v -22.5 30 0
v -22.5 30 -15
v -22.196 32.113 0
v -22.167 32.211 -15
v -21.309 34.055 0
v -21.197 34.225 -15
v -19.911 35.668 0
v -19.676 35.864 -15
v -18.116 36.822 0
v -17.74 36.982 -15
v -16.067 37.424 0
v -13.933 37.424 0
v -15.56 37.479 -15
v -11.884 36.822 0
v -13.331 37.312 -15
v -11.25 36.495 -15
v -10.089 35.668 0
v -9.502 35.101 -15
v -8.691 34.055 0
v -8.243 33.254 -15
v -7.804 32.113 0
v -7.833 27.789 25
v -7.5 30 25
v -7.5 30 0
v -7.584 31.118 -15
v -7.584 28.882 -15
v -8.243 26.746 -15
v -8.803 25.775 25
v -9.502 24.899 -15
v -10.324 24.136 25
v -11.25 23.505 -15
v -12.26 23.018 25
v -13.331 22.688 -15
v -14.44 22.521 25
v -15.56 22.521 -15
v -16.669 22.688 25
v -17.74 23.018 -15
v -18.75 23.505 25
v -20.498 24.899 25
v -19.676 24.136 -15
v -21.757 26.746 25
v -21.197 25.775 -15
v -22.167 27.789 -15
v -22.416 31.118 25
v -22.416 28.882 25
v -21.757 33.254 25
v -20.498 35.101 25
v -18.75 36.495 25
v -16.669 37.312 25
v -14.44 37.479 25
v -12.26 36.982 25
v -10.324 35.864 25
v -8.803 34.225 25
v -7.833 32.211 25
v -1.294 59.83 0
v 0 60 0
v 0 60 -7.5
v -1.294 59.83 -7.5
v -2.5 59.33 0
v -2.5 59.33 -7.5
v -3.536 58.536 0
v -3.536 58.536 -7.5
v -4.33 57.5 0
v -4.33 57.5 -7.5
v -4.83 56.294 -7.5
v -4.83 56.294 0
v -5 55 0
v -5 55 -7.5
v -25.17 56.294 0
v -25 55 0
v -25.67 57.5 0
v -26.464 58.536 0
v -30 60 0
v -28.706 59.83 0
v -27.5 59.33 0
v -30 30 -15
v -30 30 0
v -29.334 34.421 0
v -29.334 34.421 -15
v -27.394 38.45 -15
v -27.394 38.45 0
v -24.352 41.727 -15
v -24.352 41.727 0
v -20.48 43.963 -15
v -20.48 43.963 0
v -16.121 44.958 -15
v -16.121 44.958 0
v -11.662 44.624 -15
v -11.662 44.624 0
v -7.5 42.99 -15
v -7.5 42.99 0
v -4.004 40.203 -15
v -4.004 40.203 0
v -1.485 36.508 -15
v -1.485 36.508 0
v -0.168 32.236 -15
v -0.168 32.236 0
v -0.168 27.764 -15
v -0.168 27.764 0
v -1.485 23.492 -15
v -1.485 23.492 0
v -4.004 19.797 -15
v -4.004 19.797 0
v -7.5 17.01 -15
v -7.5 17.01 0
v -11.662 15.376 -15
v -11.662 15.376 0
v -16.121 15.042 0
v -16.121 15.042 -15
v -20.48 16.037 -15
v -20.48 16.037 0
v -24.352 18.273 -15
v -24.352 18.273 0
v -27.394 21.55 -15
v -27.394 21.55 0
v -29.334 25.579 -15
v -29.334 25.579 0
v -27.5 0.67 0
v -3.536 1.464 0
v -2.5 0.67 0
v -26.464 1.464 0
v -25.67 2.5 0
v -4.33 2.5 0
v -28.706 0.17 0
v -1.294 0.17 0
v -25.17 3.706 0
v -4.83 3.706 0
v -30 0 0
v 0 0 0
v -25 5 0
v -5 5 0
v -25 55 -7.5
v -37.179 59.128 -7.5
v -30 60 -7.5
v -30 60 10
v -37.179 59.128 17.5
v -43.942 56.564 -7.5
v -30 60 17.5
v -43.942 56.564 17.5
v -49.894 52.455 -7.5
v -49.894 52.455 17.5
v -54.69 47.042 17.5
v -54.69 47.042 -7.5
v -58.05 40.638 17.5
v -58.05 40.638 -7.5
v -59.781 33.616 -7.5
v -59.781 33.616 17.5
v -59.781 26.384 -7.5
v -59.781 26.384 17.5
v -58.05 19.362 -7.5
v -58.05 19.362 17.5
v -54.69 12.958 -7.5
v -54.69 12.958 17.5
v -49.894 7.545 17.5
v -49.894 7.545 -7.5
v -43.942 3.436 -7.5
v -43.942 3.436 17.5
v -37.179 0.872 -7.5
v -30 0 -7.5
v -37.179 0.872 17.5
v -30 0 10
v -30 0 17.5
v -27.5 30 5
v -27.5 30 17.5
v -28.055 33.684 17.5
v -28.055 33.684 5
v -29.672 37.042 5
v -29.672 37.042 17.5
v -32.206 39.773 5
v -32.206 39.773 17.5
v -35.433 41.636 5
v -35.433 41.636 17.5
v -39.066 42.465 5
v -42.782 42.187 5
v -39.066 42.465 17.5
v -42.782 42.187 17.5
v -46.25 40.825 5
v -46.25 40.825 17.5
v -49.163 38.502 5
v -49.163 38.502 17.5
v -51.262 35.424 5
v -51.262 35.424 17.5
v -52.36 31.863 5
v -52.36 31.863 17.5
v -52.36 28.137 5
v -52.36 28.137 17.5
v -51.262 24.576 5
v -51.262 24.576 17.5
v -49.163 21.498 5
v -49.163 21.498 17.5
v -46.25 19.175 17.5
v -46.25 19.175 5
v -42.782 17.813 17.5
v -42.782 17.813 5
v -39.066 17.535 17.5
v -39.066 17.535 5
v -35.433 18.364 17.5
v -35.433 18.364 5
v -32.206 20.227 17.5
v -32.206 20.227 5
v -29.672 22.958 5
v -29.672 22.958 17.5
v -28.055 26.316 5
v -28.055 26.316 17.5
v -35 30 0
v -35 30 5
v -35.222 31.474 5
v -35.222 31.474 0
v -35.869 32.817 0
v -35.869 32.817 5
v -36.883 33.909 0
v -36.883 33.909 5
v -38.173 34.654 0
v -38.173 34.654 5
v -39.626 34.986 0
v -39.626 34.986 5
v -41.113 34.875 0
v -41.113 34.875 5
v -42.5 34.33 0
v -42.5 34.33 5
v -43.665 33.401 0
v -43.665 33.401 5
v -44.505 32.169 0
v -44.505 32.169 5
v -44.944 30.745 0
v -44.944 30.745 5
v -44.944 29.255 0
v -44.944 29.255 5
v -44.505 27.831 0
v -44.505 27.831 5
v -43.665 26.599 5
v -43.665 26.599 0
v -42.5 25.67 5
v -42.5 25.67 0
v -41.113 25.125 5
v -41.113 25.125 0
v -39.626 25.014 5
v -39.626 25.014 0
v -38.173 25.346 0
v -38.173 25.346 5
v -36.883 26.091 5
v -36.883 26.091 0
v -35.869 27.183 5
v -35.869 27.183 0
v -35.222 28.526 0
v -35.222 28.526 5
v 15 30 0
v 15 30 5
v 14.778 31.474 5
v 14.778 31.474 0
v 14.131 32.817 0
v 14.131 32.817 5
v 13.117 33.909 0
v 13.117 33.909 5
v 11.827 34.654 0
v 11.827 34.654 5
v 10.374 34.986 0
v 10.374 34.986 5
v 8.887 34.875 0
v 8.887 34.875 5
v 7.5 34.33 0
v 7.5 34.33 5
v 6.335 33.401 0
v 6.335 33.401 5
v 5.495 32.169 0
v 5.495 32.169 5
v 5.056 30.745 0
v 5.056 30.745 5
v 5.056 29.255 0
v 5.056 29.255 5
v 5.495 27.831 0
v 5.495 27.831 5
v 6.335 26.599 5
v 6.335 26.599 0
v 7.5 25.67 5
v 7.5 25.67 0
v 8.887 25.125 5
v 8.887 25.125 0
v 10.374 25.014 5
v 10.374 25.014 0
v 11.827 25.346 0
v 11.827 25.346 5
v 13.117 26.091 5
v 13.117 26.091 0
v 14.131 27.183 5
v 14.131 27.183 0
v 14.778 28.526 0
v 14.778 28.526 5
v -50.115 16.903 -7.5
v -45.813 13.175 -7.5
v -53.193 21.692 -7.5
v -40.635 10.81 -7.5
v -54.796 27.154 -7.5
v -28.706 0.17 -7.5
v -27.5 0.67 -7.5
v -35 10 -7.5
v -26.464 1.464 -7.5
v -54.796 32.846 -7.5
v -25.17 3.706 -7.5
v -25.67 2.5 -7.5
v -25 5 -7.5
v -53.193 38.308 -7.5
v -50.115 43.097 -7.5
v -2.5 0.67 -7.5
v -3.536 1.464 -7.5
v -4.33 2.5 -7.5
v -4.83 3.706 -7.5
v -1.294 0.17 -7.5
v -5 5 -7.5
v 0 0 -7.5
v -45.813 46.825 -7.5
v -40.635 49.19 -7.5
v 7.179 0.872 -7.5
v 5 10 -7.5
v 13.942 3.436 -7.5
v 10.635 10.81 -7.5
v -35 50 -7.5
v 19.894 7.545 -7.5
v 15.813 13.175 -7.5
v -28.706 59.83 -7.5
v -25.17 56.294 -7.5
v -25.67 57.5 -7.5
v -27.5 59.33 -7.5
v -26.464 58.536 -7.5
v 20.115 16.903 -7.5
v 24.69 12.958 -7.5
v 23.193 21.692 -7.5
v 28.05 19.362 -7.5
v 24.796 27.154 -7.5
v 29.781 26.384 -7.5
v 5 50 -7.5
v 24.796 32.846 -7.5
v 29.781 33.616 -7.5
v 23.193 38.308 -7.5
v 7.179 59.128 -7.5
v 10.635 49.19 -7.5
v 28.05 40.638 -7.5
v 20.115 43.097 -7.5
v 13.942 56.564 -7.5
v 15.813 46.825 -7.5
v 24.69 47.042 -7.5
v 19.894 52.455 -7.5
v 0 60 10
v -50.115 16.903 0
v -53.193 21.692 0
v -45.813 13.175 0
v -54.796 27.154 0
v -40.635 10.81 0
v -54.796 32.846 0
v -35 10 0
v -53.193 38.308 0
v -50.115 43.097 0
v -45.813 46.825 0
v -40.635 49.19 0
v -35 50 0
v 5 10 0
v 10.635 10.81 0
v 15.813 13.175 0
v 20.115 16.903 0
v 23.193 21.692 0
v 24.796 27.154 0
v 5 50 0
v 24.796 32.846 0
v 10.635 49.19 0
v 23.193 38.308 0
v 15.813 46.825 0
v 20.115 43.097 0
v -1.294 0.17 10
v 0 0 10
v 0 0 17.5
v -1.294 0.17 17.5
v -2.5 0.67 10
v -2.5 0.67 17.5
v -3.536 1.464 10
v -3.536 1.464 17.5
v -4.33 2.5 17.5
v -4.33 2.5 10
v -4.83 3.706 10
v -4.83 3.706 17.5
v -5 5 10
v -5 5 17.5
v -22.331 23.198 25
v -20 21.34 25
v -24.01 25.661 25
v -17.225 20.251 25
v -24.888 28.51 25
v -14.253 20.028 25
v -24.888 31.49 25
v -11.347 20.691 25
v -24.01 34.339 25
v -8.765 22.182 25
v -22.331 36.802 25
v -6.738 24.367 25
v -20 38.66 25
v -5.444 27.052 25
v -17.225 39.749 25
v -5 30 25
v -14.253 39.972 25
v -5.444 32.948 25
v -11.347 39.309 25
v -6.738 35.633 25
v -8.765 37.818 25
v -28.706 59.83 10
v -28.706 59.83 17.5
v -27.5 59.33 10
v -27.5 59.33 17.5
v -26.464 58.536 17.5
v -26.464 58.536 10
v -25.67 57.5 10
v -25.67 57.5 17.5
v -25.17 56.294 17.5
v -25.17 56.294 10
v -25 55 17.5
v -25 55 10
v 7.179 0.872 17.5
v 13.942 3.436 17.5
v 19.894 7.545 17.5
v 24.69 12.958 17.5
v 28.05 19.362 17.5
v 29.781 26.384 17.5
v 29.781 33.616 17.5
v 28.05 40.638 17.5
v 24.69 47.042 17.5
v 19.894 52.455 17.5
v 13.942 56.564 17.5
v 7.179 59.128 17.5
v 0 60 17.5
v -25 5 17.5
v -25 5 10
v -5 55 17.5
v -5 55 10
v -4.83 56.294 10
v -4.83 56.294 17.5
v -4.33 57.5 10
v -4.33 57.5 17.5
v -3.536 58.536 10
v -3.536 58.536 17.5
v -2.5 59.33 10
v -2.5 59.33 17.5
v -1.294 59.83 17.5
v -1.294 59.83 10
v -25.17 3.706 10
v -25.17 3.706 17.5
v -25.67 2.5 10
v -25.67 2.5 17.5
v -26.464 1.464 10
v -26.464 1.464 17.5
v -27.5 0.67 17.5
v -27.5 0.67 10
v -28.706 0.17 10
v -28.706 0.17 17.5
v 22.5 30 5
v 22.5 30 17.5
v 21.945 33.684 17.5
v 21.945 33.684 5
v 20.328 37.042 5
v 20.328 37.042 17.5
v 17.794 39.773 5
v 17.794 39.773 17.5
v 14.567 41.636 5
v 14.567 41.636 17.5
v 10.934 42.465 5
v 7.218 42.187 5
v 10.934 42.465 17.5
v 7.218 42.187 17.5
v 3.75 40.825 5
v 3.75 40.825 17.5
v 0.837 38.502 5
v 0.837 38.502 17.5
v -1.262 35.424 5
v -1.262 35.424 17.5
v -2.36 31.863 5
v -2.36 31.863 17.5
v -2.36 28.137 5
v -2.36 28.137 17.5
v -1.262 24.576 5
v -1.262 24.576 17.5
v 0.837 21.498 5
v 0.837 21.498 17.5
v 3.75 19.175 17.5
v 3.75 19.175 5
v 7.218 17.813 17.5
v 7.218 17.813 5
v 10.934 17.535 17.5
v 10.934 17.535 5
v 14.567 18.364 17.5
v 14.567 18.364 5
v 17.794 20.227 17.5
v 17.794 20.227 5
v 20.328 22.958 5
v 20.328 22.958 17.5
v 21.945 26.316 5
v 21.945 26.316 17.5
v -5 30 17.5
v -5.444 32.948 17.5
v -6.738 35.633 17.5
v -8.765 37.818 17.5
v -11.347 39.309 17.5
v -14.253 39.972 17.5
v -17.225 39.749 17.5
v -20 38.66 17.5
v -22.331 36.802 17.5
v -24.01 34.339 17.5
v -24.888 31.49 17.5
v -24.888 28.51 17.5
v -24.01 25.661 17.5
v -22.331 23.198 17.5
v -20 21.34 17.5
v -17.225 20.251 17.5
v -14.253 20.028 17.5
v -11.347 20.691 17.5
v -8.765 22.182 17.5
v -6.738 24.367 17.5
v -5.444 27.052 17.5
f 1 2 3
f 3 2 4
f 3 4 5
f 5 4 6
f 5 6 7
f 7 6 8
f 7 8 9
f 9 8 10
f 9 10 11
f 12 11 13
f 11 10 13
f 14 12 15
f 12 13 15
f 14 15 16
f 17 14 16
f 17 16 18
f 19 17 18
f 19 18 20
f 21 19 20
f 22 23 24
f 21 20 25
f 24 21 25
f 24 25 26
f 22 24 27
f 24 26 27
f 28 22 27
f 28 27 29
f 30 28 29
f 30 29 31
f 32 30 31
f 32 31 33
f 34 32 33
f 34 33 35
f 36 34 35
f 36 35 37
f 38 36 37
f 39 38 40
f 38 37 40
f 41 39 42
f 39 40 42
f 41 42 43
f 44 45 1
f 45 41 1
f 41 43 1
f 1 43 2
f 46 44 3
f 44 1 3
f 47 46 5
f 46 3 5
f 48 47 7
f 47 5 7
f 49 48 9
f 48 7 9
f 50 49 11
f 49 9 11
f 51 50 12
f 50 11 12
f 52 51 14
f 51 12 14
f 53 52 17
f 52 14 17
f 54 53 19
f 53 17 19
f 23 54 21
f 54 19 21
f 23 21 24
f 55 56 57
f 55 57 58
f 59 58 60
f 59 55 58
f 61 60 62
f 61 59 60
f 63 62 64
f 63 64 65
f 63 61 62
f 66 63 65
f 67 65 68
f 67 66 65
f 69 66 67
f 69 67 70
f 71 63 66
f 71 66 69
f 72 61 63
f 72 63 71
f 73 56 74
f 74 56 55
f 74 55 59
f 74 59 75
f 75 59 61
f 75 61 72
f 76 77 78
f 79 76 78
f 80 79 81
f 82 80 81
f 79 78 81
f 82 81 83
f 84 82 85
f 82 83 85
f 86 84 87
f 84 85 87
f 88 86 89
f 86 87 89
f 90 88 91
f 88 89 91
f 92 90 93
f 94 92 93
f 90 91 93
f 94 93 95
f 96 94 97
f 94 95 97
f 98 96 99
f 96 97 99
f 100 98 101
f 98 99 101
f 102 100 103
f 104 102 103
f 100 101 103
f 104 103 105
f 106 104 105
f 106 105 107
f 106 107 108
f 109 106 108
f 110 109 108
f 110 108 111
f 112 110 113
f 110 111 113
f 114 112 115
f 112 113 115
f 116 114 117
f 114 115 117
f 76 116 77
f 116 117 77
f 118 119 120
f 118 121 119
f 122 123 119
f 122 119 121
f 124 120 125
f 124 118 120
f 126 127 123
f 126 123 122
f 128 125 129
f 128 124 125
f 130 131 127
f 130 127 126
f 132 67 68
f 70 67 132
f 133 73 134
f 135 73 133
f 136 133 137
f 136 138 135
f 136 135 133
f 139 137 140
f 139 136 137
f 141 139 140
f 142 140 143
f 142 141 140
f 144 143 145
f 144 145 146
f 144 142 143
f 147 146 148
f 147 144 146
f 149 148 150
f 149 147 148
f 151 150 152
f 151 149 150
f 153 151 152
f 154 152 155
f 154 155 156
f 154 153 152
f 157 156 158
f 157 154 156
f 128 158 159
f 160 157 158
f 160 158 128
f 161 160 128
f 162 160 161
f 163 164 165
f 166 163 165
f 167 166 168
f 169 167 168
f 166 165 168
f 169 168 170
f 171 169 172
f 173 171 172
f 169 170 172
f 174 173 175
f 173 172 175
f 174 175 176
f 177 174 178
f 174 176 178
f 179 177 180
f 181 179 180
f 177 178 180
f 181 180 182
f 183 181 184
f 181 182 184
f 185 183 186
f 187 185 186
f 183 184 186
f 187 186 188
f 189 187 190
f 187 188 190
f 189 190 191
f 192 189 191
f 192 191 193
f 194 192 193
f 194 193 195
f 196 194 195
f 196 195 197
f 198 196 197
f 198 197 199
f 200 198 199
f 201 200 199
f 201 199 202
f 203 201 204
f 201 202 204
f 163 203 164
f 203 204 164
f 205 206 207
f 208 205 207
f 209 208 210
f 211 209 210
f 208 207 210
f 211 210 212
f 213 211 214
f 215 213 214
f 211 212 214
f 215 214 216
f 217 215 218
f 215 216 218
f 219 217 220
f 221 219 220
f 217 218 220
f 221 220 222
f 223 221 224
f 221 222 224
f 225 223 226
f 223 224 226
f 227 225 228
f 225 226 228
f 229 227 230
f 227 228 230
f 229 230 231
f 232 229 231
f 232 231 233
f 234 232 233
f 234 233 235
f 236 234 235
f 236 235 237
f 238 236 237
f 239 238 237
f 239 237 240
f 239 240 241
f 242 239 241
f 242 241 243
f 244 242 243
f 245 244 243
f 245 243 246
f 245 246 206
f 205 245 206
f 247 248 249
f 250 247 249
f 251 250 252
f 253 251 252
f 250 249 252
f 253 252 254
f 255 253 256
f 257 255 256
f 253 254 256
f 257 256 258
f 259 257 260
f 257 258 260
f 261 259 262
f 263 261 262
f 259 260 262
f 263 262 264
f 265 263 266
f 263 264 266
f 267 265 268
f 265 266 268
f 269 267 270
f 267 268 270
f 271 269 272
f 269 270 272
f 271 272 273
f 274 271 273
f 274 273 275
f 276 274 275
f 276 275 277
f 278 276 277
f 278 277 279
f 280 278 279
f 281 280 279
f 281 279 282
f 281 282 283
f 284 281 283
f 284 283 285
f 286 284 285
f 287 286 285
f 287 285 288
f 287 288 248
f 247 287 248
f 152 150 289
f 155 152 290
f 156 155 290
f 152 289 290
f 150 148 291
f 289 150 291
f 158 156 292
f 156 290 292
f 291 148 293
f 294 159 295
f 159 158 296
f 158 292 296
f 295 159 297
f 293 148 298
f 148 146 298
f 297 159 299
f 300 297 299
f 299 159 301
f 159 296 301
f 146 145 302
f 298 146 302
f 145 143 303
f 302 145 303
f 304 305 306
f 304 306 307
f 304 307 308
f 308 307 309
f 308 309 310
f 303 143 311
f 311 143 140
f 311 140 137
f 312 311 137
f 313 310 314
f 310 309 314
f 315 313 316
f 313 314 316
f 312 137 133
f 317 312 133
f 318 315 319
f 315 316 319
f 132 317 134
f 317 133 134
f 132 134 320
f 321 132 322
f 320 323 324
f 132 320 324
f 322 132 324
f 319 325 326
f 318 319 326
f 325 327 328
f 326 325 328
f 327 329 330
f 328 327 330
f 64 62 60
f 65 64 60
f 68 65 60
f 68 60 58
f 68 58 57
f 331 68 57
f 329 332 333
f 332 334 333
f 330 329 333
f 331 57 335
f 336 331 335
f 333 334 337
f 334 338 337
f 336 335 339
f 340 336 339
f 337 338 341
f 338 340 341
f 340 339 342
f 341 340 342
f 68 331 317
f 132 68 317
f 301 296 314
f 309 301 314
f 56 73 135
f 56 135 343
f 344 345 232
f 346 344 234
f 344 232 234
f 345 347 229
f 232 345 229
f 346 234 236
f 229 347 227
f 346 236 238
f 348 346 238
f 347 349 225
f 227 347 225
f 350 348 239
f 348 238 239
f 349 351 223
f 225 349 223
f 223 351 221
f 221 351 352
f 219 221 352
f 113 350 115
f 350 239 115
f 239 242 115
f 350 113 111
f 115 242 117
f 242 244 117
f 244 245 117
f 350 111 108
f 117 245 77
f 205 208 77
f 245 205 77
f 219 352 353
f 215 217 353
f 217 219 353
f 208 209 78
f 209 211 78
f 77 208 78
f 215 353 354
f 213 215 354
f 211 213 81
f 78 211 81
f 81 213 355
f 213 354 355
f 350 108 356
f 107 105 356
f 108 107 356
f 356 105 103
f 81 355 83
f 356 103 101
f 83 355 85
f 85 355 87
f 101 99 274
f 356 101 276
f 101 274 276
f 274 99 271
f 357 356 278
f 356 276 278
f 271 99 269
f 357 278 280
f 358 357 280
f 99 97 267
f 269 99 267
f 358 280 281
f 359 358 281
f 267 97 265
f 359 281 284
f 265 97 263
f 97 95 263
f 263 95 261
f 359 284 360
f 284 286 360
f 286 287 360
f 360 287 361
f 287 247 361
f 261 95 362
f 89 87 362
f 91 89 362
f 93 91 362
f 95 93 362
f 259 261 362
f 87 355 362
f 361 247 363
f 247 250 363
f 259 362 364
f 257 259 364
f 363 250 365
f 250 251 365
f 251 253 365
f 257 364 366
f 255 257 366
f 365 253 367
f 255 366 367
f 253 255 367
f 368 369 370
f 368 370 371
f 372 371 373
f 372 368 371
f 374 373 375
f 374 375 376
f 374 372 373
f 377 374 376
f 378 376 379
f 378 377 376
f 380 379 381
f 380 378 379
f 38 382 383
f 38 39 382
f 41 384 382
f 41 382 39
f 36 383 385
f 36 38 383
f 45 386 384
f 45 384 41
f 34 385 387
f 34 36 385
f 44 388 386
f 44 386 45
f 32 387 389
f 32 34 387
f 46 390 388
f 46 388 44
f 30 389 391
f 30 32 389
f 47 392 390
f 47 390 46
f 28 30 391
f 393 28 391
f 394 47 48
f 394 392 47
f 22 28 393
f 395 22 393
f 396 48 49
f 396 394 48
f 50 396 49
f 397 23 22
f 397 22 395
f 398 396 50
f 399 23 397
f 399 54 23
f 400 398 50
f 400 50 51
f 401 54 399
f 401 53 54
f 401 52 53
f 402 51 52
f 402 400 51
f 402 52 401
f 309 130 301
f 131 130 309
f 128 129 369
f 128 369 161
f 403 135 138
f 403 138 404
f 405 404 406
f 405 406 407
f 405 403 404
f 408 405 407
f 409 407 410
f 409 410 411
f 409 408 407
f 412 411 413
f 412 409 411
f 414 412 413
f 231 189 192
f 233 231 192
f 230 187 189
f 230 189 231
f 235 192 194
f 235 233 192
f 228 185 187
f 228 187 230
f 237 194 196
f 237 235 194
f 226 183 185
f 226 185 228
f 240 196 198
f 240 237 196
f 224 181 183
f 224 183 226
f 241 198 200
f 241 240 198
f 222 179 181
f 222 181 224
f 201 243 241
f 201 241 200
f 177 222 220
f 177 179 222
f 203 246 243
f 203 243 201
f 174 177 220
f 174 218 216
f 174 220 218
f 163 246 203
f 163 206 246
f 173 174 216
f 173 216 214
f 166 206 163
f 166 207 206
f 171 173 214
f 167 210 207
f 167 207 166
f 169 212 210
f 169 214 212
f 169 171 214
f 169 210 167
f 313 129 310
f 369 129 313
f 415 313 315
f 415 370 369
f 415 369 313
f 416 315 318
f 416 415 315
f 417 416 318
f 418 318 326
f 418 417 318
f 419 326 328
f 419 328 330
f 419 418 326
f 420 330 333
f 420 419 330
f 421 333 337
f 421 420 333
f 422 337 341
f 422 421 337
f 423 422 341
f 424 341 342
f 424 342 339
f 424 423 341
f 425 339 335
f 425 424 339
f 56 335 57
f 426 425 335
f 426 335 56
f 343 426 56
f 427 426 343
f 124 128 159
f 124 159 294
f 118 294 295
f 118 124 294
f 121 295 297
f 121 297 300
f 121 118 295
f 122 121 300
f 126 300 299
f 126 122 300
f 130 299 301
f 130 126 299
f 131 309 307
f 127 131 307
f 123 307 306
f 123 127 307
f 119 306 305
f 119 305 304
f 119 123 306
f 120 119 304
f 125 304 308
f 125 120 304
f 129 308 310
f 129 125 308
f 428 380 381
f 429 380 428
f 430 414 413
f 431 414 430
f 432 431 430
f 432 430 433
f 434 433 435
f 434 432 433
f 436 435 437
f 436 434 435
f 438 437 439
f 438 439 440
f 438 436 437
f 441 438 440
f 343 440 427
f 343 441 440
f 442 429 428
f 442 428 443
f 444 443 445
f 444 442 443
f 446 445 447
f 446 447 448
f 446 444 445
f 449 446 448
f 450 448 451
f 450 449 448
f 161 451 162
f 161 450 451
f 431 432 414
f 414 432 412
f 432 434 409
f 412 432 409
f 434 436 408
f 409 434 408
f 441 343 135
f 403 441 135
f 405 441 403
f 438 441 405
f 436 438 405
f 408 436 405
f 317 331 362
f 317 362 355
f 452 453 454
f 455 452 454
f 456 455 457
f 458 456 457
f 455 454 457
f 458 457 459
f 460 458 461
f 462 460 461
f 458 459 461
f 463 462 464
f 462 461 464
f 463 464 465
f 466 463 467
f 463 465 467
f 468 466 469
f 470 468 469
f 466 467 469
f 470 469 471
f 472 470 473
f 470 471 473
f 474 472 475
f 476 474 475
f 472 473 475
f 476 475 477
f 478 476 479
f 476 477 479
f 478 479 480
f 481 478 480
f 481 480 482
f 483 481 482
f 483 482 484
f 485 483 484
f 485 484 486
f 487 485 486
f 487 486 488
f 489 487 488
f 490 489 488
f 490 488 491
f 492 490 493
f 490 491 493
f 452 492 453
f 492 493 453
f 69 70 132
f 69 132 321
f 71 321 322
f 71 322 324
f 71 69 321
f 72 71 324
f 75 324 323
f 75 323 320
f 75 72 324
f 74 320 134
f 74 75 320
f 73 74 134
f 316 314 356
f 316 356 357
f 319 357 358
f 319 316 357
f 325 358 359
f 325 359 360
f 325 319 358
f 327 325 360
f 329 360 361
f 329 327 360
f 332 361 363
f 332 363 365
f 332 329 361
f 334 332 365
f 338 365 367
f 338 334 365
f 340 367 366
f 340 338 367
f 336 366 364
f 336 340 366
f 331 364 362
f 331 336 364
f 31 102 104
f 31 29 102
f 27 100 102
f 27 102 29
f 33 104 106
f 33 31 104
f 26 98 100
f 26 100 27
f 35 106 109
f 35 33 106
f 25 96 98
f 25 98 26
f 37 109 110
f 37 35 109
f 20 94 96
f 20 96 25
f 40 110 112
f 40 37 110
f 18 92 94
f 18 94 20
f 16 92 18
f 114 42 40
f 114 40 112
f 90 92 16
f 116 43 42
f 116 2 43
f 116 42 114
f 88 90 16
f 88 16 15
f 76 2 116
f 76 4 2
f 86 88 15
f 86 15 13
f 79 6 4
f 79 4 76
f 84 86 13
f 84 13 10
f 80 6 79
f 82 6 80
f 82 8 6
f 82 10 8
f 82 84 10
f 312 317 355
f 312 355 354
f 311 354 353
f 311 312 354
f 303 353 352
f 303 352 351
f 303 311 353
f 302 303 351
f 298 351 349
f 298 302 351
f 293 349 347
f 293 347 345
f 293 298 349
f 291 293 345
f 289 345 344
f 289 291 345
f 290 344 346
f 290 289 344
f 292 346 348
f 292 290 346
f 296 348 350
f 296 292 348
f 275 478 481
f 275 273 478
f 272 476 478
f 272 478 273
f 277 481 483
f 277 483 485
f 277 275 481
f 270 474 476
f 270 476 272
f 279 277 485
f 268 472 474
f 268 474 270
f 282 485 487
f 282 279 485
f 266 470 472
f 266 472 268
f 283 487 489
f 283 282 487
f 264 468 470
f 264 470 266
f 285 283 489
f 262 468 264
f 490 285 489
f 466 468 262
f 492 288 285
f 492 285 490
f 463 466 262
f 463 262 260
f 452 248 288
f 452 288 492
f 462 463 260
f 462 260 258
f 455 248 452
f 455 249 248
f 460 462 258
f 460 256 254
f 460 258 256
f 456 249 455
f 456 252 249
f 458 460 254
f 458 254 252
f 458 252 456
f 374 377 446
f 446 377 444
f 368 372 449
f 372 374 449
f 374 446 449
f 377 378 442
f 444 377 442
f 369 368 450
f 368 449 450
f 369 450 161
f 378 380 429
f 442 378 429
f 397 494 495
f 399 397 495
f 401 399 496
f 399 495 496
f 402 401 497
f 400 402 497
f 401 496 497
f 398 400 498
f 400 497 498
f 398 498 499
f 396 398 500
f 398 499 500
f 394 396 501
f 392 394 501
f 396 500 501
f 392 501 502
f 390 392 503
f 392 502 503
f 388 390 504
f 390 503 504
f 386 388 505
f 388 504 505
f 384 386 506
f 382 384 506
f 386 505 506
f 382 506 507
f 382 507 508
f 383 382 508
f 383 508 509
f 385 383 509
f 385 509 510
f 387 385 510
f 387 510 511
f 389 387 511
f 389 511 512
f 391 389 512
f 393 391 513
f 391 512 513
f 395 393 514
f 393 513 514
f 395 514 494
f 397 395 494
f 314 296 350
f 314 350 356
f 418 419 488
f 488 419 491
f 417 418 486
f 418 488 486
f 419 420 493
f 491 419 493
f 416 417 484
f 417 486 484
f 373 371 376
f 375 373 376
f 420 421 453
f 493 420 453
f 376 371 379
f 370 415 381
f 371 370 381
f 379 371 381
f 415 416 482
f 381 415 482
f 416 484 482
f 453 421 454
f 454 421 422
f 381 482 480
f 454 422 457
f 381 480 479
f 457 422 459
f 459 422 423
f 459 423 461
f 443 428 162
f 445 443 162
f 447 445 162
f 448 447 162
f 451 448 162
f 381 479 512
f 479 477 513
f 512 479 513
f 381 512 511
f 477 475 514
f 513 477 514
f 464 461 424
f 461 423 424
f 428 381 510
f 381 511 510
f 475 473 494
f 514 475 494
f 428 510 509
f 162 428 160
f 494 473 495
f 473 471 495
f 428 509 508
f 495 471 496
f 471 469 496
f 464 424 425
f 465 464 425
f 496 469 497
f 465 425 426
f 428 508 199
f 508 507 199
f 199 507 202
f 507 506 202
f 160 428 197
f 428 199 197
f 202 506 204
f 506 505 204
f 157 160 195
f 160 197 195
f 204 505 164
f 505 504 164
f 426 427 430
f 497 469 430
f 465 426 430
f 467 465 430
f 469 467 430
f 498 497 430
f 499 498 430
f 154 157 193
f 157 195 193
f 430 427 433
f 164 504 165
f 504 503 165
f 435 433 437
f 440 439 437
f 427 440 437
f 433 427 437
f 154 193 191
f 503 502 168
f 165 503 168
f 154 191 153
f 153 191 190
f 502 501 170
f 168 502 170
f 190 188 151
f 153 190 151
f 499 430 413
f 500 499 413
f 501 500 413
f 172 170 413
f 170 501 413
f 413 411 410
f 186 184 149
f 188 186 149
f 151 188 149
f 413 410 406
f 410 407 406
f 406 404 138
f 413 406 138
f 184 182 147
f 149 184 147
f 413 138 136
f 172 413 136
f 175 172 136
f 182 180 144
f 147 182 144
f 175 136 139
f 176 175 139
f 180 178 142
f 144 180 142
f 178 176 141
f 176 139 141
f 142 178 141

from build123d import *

# Parameters (mm, degrees)
BOSS_EXTRUDE1_DEPTH = 10
BOSS_EXTRUDE2_DEPTH = 7.5
BOSS_EXTRUDE3_DEPTH = 7.5
CUT_EXTRUDE1_DEPTH  = 7.5
SKETCH5_R           = 12.5
CUT_EXTRUDE3_DEPTH  = 12.5
SKETCH6_R           = 5
CUT_EXTRUDE4_DEPTH  = 17.5
SKETCH7_R           = 10
BOSS_EXTRUDE4_DEPTH = 7.5
SKETCH8_R           = 7.5
CUT_EXTRUDE5_DEPTH  = 25
SKETCH10_R          = 15
BOSS_EXTRUDE6_DEPTH = 15
SKETCH11_R          = 7.5
CUT_EXTRUDE6_DEPTH  = 20


with BuildPart() as part:
    # Sketch1 → Boss-Extrude1 (new body)
    with BuildSketch(Plane.XY):
        with BuildLine():
            Line((-30, 60), (0, 60))
            ThreePointArc((0, 60), (30, 30), (0, 0))
            Line((0, 0), (-30, 0))
            ThreePointArc((-30, 0), (-60, 30), (-30, 60))
        make_face()
    extrude(amount=BOSS_EXTRUDE1_DEPTH)

    # Sketch2 → Boss-Extrude2 (add)
    with BuildSketch(Plane.XY.offset(10)):
        with BuildLine():
            Line((-25, 55), (-5, 55))
            ThreePointArc((-5, 55), (-3.535533906, 58.535533906), (0, 60))
            ThreePointArc((0, 60), (30, 30), (0, 0))
            ThreePointArc((0, 0), (-3.535533906, 1.464466094), (-5, 5))
            Line((-5, 5), (-25, 5))
            ThreePointArc((-25, 5), (-26.464466094, 1.464466094), (-30, 0))
            ThreePointArc((-30, 0), (-60, 30), (-30, 60))
            ThreePointArc((-30, 60), (-26.464466094, 58.535533906), (-25, 55))
        make_face()
    extrude(amount=BOSS_EXTRUDE2_DEPTH)

    # Sketch3 → Boss-Extrude3 (add)
    with BuildSketch(Plane(origin=(0, 0, 0), x_dir=(-1, 0, 0), z_dir=(0, 0, -1))):
        with BuildLine():
            Line((5, 55), (25, 55))
            ThreePointArc((25, 55), (26.464466094, 58.535533906), (30, 60))
            ThreePointArc((30, 60), (60, 30), (30, 0))
            ThreePointArc((30, 0), (26.464466094, 1.464466094), (25, 5))
            Line((25, 5), (5, 5))
            ThreePointArc((5, 5), (3.535533906, 1.464466094), (0, 0))
            ThreePointArc((0, 0), (-30, 30), (0, 60))
            ThreePointArc((0, 60), (3.535533906, 58.535533906), (5, 55))
        make_face()
    extrude(amount=BOSS_EXTRUDE3_DEPTH)

    # Sketch4 → Cut-Extrude1 (cut)
    with BuildSketch(Plane(origin=(0, 0, -7.5), x_dir=(-1, 0, 0), z_dir=(0, 0, -1))):
        with BuildLine():
            Line((-5, 50), (35, 50))
            ThreePointArc((35, 50), (55, 30), (35, 10))
            Line((35, 10), (-5, 10))
            ThreePointArc((-5, 10), (-25, 30), (-5, 50))
        make_face()
    extrude(amount=-CUT_EXTRUDE1_DEPTH, mode=Mode.SUBTRACT)

    # Sketch5 → Cut-Extrude3 (cut)
    with BuildSketch(Plane.XY.offset(17.5)):
        with Locations((10, 30)):
            Circle(SKETCH5_R)
        with Locations((-40, 30)):
            Circle(SKETCH5_R)
    extrude(amount=-CUT_EXTRUDE3_DEPTH, mode=Mode.SUBTRACT)

    # Sketch6 → Cut-Extrude4 (cut)
    with BuildSketch(Plane.XY.offset(5)):
        with Locations((10, 30)):
            Circle(SKETCH6_R)
        with Locations((-40, 30)):
            Circle(SKETCH6_R)
    extrude(amount=-CUT_EXTRUDE4_DEPTH, mode=Mode.SUBTRACT)

    # Sketch7 → Boss-Extrude4 (add)
    with BuildSketch(Plane.XY.offset(17.5)):
        with Locations((-15, 30)):
            Circle(SKETCH7_R)
    extrude(amount=BOSS_EXTRUDE4_DEPTH)

    # Sketch8 → Cut-Extrude5 (cut)
    with BuildSketch(Plane.XY.offset(25)):
        with Locations((-15, 30)):
            Circle(SKETCH8_R)
    extrude(amount=-CUT_EXTRUDE5_DEPTH, mode=Mode.SUBTRACT)

    # Sketch10 → Boss-Extrude6 (add)
    with BuildSketch(Plane(origin=(0, 0, 0), x_dir=(-1, 0, 0), z_dir=(0, 0, -1))):
        with Locations((15, 30)):
            Circle(SKETCH10_R)
    extrude(amount=BOSS_EXTRUDE6_DEPTH)

    # Sketch11 → Cut-Extrude6 (cut)
    with BuildSketch(Plane(origin=(0, 0, -15), x_dir=(-1, 0, 0), z_dir=(0, 0, -1))):
        with Locations((15, 30)):
            Circle(SKETCH11_R)
    extrude(amount=-CUT_EXTRUDE6_DEPTH, mode=Mode.SUBTRACT)


solid = part.part
